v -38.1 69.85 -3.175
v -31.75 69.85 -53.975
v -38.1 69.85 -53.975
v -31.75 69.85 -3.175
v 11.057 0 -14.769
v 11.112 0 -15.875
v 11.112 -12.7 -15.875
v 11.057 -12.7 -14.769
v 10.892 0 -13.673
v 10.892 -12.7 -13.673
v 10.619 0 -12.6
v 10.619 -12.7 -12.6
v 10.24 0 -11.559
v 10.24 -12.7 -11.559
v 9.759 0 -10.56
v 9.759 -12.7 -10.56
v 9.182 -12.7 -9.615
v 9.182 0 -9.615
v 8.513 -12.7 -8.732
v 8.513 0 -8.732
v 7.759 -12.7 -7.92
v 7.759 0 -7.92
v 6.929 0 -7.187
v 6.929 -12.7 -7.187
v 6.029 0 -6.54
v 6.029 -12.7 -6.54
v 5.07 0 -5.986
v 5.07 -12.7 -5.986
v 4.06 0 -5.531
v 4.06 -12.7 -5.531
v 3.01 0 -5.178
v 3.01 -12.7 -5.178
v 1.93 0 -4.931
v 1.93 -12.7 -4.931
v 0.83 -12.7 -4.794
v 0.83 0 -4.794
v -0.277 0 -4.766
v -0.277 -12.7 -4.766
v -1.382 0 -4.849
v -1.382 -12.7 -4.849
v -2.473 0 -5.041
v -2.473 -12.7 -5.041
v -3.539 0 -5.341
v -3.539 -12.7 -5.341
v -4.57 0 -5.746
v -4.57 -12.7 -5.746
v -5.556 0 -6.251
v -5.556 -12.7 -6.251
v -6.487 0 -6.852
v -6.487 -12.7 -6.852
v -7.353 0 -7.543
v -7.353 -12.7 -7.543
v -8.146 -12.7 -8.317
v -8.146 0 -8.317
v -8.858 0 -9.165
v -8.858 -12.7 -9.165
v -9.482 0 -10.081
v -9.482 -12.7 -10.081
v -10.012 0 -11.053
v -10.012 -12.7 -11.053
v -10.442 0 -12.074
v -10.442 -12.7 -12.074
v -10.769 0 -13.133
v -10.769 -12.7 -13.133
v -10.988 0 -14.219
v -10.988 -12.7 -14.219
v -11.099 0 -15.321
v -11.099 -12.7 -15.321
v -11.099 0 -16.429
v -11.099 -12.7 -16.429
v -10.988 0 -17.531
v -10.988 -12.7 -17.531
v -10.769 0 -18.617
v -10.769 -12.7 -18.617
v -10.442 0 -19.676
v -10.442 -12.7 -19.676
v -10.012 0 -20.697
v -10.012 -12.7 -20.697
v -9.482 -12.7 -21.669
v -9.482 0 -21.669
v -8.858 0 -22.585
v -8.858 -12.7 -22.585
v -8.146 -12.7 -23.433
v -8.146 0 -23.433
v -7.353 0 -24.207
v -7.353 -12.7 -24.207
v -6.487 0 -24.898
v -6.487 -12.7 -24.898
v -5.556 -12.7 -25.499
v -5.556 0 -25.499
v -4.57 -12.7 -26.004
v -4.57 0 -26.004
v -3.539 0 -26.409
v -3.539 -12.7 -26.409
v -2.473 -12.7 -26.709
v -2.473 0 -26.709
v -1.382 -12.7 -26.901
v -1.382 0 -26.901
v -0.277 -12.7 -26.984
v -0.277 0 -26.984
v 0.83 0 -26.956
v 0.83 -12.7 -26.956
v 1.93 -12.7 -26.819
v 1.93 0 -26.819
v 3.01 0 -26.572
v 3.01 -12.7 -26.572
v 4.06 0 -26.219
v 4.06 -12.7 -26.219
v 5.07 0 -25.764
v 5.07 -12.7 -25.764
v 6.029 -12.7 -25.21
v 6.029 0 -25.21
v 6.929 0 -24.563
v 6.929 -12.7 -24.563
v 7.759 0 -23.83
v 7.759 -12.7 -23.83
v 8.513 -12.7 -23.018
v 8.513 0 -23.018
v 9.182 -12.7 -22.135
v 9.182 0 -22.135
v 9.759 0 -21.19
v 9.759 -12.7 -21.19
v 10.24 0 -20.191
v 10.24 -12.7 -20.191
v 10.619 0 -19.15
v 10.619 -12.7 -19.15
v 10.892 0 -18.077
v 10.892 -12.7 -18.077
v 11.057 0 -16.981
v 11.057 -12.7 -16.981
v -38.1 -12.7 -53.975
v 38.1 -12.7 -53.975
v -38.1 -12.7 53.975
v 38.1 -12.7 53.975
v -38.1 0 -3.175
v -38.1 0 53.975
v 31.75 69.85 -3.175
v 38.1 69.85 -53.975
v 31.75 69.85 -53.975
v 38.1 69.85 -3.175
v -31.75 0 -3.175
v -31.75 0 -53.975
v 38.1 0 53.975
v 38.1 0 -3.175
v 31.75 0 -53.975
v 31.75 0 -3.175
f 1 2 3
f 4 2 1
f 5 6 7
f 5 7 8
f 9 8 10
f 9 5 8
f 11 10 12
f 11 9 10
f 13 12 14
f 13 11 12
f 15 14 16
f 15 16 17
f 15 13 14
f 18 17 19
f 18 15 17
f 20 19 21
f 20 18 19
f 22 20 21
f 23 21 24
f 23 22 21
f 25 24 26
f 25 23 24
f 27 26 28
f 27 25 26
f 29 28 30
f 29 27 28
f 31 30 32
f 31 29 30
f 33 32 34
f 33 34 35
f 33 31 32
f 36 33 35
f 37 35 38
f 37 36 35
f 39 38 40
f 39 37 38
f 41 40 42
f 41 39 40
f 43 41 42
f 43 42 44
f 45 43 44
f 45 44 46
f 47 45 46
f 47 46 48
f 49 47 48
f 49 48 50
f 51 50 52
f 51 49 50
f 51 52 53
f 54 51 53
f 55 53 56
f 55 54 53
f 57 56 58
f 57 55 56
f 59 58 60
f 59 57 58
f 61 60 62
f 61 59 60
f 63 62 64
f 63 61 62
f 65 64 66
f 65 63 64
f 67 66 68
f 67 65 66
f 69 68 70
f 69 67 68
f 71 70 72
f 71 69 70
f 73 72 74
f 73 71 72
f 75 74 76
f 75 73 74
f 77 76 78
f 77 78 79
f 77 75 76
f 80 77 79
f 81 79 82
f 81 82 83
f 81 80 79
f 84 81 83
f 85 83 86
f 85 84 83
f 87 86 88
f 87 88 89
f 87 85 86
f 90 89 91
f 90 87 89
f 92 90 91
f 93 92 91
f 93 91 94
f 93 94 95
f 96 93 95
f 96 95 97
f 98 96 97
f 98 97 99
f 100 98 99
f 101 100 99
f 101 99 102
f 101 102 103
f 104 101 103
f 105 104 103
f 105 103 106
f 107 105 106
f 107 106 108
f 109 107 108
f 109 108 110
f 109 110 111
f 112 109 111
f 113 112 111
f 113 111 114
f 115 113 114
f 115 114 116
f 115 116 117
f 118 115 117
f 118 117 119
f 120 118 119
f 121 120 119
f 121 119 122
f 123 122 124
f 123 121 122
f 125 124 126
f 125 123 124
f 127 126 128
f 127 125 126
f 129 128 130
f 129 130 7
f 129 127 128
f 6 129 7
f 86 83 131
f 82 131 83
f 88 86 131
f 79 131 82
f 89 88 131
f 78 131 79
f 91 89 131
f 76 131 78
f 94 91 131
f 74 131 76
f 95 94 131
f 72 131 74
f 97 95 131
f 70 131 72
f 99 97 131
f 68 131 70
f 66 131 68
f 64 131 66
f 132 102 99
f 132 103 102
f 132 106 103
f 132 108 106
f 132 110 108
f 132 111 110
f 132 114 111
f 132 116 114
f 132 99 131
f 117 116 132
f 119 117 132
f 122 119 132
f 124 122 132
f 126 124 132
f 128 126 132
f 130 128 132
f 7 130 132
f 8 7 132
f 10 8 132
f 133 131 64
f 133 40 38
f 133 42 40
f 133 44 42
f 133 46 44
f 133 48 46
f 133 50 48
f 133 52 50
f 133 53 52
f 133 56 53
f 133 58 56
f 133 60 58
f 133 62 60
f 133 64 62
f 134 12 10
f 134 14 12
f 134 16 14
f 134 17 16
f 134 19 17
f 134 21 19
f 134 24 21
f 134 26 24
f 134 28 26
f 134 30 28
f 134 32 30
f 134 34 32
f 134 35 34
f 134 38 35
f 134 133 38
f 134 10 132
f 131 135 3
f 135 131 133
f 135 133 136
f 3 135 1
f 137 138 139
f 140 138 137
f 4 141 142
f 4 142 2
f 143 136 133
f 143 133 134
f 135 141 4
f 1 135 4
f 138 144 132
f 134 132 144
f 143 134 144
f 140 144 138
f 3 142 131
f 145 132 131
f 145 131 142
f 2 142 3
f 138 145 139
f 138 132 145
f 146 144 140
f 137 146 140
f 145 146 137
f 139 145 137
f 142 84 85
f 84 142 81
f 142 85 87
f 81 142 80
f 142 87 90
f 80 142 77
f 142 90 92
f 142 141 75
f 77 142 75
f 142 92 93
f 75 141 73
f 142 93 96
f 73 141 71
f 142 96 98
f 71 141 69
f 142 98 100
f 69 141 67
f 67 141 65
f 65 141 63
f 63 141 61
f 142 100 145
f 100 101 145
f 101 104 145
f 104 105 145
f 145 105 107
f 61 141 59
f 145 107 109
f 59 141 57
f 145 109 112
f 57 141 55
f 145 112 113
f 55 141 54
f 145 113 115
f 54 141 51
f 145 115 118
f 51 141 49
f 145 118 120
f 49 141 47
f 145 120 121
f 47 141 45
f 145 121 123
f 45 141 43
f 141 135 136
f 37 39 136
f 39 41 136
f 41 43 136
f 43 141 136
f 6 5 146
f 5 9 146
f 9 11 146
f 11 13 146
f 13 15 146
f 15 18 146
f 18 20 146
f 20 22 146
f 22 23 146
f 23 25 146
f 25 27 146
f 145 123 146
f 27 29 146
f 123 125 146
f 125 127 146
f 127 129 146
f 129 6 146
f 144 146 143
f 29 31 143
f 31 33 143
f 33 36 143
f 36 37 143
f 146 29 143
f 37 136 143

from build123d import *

# Parameters (mm, degrees)
F0_W     = 76.2
F0_H     = 107.95
F0_R     = 11.1125
F1_DEPTH = 12.7
F2_W     = 69.85
F2_H     = 50.8
F3_DEPTH = 6.35
F4_START = -69.85
F4_DEPTH = 6.35


with BuildPart() as f1:
    # F0 (on Front) → F1 (new body)
    with BuildSketch(Plane.XZ):
        Rectangle(F0_W, F0_H)
        with Locations((0, -15.875)):
            Circle(F0_R, mode=Mode.SUBTRACT)
    extrude(amount=F1_DEPTH)

    # F2 (on face) → F3 (join)
    with BuildSketch(Plane.YZ.offset(38.1)):
        with Locations((34.925, -28.575)):
            Rectangle(F2_W, F2_H)
    extrude(amount=-F3_DEPTH)

    # F2 (on face) → F4 (join)
    with BuildSketch(Plane.YZ.offset(38.1).offset(F4_START)):
        with Locations((34.925, -28.575)):
            Rectangle(F2_W, F2_H)
    extrude(amount=-F4_DEPTH)


solid = f1.part
